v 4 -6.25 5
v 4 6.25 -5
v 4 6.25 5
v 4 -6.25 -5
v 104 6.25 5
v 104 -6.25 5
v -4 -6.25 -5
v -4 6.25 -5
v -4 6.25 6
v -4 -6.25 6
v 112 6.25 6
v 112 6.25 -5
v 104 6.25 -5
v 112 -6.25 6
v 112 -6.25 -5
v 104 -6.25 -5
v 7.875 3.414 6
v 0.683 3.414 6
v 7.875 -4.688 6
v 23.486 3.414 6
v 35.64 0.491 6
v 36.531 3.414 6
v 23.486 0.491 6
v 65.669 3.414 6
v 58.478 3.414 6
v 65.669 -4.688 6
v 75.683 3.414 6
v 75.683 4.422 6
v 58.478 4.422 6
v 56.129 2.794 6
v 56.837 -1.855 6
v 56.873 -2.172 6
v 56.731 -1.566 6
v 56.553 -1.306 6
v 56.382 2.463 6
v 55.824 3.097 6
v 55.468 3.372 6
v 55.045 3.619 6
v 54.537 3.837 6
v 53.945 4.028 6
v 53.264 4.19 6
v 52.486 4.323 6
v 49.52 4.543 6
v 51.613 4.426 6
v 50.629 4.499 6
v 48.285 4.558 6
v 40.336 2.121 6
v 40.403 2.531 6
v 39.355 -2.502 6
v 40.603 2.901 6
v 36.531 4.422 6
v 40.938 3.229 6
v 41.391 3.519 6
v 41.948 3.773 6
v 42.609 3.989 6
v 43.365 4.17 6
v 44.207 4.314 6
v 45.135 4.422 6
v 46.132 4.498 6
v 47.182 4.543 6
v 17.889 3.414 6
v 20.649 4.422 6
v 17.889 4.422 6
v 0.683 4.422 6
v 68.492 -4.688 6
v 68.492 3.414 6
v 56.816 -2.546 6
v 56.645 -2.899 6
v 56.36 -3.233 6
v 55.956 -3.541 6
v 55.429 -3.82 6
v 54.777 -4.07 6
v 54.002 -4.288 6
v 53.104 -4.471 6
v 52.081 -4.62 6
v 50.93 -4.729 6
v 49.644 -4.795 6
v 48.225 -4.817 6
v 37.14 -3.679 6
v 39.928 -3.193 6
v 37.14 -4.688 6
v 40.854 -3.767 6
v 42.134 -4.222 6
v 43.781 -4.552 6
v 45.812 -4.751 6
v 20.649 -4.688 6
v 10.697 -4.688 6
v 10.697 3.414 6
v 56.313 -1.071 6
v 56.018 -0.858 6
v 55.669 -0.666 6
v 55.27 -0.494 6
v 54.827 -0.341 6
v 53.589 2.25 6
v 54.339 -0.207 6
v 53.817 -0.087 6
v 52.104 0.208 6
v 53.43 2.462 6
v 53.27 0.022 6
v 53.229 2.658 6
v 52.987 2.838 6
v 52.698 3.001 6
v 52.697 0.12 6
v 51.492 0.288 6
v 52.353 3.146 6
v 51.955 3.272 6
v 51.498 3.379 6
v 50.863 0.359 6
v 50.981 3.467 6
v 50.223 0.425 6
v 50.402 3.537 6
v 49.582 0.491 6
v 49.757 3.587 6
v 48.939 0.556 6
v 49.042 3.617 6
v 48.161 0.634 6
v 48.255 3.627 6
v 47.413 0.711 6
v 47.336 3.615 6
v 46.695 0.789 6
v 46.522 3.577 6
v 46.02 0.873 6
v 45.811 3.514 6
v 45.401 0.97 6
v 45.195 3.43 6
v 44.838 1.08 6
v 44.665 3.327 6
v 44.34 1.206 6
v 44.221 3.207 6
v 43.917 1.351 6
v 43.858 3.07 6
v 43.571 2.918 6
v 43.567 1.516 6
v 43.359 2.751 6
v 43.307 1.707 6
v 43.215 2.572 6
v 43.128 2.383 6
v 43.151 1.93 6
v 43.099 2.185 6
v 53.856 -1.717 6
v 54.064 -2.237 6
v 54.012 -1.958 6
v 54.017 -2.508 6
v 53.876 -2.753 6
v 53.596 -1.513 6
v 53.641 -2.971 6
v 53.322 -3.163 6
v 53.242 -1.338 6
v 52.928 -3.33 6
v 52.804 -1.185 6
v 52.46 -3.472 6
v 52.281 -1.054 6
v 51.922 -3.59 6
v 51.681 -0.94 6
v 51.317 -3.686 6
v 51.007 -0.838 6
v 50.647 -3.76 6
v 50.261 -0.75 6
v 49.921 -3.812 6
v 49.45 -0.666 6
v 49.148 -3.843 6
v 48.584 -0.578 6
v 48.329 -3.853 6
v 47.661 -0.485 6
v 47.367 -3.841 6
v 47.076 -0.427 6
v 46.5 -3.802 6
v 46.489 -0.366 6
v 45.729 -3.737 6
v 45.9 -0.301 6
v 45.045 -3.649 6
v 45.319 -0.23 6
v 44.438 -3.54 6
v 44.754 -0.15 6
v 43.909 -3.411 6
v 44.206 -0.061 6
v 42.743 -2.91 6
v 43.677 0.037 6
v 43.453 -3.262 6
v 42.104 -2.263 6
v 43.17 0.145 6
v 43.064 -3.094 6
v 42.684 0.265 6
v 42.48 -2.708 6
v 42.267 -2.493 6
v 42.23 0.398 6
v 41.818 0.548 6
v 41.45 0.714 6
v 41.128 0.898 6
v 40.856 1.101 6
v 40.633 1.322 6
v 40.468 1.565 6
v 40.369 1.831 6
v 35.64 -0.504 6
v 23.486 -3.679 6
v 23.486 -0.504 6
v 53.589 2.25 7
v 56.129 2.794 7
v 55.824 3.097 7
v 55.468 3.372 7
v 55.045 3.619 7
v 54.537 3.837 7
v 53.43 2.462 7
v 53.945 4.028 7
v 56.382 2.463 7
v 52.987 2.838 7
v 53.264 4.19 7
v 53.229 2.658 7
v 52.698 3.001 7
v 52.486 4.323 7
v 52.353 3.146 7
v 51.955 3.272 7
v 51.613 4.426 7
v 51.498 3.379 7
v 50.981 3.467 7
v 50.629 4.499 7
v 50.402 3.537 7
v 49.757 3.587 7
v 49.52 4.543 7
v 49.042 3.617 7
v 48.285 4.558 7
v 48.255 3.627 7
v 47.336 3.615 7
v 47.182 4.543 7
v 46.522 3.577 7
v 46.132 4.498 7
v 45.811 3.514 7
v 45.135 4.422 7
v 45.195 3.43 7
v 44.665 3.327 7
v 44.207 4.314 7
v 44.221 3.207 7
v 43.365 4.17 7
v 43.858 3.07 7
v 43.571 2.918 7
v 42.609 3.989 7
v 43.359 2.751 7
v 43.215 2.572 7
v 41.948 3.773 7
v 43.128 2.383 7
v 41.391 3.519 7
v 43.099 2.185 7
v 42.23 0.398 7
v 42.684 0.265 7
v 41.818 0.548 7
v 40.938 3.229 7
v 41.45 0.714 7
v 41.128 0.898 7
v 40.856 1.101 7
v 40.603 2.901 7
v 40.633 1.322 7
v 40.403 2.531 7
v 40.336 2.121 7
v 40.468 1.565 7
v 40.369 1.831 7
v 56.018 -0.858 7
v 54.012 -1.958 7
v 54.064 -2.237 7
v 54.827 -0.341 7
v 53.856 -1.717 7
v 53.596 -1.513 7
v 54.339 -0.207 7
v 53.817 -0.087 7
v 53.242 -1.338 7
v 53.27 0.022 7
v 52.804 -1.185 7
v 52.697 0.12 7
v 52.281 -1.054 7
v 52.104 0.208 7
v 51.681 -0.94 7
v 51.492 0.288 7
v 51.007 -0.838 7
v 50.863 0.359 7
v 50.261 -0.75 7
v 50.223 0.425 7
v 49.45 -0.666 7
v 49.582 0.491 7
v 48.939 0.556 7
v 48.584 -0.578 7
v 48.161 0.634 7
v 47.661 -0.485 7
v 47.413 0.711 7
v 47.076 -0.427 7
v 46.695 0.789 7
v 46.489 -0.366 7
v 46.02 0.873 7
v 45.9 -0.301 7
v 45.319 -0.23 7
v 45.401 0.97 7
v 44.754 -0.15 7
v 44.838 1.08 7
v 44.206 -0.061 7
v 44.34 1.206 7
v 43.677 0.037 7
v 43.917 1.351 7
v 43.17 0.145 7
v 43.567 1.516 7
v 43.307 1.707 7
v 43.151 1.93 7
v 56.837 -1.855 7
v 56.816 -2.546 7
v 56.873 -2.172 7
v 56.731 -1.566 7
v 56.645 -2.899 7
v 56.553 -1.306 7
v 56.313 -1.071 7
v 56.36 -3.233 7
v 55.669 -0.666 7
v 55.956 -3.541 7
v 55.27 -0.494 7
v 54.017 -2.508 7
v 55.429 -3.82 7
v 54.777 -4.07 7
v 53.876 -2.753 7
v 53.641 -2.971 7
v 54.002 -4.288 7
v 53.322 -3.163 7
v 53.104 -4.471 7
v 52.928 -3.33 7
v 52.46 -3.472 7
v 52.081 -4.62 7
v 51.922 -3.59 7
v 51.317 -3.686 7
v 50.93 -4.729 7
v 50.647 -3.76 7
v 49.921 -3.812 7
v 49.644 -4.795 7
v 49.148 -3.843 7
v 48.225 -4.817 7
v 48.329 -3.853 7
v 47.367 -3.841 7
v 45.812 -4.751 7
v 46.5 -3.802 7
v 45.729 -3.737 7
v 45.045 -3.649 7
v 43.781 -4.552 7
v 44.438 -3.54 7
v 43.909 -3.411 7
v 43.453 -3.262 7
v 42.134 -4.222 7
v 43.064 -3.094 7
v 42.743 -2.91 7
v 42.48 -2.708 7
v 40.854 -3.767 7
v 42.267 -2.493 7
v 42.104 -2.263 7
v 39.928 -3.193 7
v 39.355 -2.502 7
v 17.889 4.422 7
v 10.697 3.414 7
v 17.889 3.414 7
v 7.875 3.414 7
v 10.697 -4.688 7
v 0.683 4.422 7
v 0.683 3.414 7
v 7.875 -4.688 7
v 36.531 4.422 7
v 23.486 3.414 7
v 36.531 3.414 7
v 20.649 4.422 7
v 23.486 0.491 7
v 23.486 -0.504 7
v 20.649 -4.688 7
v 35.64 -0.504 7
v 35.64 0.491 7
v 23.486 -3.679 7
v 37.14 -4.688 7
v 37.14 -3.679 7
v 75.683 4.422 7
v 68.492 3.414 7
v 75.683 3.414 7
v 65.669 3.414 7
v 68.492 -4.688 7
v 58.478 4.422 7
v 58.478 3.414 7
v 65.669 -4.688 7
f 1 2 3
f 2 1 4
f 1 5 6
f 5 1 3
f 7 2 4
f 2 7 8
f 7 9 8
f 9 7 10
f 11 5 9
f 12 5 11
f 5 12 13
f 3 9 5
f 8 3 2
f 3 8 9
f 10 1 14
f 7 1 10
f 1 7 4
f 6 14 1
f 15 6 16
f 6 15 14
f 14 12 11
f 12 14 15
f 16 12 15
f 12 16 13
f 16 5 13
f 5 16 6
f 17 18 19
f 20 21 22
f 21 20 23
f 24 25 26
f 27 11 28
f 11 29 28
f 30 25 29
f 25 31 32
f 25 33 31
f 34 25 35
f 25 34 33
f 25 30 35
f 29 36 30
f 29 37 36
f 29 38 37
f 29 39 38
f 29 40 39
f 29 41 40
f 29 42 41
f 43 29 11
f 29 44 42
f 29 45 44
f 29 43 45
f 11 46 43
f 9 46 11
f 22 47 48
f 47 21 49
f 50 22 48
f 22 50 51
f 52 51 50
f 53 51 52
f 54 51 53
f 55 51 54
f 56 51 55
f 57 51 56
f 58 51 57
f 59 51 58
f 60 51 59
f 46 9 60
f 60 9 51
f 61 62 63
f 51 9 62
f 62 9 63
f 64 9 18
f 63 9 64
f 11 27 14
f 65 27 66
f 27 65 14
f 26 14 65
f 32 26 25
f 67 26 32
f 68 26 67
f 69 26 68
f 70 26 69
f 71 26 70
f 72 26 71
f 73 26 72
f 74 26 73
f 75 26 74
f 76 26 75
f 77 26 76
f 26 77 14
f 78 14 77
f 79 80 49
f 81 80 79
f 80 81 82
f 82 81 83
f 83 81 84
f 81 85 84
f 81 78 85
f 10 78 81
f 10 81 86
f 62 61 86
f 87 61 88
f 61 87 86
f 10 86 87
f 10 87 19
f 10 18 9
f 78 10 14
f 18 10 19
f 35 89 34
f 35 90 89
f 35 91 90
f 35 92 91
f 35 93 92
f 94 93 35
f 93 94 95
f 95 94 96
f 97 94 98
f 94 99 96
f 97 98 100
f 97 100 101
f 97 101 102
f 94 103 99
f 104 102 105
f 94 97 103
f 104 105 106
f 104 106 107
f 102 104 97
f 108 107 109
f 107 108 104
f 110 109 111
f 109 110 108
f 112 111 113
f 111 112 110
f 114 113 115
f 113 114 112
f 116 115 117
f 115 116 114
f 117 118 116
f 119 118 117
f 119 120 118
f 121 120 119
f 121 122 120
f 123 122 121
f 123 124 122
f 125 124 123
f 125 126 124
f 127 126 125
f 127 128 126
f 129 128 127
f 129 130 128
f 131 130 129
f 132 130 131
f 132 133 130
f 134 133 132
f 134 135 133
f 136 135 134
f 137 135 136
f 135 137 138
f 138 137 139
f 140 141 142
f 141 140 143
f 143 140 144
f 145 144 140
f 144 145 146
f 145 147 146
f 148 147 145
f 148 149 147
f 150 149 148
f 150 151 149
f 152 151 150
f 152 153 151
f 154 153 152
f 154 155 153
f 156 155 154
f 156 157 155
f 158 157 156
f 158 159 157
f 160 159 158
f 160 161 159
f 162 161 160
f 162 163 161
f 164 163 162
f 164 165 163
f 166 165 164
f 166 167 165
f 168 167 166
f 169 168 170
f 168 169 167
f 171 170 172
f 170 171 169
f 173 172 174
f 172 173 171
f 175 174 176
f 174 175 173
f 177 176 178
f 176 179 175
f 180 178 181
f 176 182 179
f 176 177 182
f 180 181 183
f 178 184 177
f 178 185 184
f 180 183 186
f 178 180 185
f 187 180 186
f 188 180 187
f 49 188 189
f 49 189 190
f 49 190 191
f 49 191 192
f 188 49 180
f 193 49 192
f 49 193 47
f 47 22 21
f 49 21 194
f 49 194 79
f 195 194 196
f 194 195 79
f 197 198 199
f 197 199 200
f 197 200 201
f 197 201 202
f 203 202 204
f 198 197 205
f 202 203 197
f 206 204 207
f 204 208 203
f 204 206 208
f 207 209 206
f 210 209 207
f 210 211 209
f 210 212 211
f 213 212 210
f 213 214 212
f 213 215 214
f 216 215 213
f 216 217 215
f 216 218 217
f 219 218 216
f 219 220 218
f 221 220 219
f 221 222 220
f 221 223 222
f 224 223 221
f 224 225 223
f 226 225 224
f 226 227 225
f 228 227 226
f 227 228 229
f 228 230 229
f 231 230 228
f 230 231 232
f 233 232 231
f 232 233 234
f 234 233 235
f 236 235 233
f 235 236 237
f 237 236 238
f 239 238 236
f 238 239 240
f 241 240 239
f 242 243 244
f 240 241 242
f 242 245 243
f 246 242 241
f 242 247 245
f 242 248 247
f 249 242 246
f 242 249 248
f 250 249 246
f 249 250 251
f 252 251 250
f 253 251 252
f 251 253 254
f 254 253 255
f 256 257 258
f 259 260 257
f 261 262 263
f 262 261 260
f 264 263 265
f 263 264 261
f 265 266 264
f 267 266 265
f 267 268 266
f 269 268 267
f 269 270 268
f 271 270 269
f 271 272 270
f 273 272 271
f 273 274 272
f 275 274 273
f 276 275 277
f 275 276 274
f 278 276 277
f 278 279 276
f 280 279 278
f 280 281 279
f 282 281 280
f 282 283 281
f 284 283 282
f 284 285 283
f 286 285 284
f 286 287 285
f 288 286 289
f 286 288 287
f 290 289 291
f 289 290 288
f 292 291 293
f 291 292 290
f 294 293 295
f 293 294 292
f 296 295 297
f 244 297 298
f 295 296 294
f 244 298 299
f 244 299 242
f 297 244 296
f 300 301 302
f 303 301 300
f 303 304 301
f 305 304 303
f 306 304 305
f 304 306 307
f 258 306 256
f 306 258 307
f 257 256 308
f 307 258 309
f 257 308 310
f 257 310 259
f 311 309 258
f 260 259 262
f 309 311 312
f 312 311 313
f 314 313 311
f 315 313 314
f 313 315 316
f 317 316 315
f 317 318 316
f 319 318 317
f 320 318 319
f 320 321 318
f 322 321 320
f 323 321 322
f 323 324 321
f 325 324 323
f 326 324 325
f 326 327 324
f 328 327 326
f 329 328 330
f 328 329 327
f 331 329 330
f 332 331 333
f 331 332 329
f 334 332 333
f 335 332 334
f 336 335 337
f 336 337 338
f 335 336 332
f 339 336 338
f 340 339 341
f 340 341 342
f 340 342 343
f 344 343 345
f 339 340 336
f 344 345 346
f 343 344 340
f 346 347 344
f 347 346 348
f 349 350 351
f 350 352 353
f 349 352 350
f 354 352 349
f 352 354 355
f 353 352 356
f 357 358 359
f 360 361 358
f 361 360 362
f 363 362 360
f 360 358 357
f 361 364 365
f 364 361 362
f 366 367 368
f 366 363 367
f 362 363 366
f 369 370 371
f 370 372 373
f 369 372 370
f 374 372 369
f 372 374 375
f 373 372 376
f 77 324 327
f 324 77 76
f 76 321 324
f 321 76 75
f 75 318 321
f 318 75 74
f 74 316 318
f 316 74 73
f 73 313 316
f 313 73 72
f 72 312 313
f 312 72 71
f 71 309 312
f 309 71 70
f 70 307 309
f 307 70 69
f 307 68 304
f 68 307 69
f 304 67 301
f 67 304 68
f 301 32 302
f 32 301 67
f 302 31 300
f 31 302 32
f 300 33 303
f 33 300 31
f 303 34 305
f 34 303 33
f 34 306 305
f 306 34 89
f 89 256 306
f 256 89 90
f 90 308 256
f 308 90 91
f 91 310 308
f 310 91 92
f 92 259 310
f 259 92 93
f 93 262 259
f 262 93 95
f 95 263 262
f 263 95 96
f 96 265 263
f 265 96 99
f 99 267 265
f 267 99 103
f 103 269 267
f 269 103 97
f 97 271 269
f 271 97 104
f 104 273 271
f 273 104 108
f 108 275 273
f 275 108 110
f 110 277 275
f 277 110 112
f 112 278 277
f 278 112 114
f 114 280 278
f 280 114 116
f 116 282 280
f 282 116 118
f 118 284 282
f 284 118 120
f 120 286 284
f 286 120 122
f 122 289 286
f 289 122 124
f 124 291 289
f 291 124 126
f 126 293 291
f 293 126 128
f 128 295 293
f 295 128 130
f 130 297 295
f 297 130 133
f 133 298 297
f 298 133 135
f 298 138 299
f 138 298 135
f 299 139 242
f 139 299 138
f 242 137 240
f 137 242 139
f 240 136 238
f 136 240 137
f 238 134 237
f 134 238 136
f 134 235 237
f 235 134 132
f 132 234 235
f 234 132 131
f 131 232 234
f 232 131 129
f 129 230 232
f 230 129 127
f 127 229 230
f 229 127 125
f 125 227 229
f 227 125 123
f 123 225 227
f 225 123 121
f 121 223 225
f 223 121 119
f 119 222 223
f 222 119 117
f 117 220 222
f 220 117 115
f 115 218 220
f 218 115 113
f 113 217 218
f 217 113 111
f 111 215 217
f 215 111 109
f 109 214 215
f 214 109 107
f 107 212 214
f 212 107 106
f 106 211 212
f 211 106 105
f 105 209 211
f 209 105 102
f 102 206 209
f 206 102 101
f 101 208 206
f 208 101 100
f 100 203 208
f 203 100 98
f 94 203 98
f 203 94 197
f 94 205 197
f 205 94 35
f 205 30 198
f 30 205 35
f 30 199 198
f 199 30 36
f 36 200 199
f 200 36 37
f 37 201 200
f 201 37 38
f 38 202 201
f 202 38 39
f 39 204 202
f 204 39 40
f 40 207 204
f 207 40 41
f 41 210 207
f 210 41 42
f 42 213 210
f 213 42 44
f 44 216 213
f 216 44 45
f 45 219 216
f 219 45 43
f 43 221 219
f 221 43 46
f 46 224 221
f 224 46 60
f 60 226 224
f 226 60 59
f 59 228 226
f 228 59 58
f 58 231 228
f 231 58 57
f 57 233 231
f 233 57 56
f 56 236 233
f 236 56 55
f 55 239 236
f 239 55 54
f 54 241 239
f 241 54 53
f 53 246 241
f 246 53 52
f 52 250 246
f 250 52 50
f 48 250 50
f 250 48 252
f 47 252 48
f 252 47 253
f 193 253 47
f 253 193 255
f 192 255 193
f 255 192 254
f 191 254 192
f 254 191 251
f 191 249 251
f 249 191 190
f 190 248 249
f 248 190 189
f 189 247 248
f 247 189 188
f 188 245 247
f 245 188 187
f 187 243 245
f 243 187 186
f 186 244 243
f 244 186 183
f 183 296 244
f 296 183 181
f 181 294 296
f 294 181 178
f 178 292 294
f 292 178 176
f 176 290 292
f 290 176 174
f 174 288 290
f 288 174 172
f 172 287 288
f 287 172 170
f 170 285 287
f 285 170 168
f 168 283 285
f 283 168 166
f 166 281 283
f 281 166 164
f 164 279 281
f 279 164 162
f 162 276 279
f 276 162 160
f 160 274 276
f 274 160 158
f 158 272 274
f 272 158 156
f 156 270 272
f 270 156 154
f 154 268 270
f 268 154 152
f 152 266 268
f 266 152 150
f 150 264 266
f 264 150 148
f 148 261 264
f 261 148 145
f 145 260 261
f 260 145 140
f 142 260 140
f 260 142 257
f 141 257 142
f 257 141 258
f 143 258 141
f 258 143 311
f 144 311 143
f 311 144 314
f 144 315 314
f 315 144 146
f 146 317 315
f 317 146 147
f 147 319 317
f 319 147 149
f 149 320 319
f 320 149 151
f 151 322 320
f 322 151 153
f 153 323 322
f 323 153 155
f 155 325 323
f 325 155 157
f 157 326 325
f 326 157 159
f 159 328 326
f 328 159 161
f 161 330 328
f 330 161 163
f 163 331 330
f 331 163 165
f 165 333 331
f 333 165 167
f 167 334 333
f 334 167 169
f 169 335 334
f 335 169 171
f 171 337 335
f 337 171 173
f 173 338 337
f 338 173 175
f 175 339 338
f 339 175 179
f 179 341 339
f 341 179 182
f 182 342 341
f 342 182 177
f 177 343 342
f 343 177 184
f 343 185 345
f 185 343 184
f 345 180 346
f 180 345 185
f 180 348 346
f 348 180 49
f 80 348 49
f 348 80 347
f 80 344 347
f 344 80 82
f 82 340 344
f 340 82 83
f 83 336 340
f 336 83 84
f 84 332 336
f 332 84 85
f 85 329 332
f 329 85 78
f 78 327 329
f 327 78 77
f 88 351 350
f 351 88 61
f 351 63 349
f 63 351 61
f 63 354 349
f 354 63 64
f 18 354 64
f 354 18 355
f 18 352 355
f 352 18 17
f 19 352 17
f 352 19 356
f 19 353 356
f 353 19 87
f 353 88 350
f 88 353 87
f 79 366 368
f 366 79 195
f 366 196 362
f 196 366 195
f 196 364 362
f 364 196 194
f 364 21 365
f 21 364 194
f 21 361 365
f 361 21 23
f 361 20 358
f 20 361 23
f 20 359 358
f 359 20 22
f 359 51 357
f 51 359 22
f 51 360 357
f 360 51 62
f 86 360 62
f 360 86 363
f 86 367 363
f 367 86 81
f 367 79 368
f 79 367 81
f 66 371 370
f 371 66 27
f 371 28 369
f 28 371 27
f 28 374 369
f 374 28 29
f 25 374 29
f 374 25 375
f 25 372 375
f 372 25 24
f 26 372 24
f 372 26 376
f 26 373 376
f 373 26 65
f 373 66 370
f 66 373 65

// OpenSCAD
module bridge(width = 12.5,
              length = 100,
              height = 10) {
    base = 8;
    bridge_thick = 1;
    magic = 0.75;

    cube([base,width,height],center=true);
    translate([length+base,0,0])
        cube([base,width,height],center=true);
    color("red")
        translate([length/2+base/2,0,height/2+bridge_thick/2])
            cube([length+2*base,width,bridge_thick],center=true);

    mySize = (width > length) ? length : width;
    translate([0,-width/2*magic,height/2+bridge_thick])
        resize([length*magic,width*magic,1])
            linear_extrude(height = magic)
                text("TEST", size=mySize/2);
}


bridge();
